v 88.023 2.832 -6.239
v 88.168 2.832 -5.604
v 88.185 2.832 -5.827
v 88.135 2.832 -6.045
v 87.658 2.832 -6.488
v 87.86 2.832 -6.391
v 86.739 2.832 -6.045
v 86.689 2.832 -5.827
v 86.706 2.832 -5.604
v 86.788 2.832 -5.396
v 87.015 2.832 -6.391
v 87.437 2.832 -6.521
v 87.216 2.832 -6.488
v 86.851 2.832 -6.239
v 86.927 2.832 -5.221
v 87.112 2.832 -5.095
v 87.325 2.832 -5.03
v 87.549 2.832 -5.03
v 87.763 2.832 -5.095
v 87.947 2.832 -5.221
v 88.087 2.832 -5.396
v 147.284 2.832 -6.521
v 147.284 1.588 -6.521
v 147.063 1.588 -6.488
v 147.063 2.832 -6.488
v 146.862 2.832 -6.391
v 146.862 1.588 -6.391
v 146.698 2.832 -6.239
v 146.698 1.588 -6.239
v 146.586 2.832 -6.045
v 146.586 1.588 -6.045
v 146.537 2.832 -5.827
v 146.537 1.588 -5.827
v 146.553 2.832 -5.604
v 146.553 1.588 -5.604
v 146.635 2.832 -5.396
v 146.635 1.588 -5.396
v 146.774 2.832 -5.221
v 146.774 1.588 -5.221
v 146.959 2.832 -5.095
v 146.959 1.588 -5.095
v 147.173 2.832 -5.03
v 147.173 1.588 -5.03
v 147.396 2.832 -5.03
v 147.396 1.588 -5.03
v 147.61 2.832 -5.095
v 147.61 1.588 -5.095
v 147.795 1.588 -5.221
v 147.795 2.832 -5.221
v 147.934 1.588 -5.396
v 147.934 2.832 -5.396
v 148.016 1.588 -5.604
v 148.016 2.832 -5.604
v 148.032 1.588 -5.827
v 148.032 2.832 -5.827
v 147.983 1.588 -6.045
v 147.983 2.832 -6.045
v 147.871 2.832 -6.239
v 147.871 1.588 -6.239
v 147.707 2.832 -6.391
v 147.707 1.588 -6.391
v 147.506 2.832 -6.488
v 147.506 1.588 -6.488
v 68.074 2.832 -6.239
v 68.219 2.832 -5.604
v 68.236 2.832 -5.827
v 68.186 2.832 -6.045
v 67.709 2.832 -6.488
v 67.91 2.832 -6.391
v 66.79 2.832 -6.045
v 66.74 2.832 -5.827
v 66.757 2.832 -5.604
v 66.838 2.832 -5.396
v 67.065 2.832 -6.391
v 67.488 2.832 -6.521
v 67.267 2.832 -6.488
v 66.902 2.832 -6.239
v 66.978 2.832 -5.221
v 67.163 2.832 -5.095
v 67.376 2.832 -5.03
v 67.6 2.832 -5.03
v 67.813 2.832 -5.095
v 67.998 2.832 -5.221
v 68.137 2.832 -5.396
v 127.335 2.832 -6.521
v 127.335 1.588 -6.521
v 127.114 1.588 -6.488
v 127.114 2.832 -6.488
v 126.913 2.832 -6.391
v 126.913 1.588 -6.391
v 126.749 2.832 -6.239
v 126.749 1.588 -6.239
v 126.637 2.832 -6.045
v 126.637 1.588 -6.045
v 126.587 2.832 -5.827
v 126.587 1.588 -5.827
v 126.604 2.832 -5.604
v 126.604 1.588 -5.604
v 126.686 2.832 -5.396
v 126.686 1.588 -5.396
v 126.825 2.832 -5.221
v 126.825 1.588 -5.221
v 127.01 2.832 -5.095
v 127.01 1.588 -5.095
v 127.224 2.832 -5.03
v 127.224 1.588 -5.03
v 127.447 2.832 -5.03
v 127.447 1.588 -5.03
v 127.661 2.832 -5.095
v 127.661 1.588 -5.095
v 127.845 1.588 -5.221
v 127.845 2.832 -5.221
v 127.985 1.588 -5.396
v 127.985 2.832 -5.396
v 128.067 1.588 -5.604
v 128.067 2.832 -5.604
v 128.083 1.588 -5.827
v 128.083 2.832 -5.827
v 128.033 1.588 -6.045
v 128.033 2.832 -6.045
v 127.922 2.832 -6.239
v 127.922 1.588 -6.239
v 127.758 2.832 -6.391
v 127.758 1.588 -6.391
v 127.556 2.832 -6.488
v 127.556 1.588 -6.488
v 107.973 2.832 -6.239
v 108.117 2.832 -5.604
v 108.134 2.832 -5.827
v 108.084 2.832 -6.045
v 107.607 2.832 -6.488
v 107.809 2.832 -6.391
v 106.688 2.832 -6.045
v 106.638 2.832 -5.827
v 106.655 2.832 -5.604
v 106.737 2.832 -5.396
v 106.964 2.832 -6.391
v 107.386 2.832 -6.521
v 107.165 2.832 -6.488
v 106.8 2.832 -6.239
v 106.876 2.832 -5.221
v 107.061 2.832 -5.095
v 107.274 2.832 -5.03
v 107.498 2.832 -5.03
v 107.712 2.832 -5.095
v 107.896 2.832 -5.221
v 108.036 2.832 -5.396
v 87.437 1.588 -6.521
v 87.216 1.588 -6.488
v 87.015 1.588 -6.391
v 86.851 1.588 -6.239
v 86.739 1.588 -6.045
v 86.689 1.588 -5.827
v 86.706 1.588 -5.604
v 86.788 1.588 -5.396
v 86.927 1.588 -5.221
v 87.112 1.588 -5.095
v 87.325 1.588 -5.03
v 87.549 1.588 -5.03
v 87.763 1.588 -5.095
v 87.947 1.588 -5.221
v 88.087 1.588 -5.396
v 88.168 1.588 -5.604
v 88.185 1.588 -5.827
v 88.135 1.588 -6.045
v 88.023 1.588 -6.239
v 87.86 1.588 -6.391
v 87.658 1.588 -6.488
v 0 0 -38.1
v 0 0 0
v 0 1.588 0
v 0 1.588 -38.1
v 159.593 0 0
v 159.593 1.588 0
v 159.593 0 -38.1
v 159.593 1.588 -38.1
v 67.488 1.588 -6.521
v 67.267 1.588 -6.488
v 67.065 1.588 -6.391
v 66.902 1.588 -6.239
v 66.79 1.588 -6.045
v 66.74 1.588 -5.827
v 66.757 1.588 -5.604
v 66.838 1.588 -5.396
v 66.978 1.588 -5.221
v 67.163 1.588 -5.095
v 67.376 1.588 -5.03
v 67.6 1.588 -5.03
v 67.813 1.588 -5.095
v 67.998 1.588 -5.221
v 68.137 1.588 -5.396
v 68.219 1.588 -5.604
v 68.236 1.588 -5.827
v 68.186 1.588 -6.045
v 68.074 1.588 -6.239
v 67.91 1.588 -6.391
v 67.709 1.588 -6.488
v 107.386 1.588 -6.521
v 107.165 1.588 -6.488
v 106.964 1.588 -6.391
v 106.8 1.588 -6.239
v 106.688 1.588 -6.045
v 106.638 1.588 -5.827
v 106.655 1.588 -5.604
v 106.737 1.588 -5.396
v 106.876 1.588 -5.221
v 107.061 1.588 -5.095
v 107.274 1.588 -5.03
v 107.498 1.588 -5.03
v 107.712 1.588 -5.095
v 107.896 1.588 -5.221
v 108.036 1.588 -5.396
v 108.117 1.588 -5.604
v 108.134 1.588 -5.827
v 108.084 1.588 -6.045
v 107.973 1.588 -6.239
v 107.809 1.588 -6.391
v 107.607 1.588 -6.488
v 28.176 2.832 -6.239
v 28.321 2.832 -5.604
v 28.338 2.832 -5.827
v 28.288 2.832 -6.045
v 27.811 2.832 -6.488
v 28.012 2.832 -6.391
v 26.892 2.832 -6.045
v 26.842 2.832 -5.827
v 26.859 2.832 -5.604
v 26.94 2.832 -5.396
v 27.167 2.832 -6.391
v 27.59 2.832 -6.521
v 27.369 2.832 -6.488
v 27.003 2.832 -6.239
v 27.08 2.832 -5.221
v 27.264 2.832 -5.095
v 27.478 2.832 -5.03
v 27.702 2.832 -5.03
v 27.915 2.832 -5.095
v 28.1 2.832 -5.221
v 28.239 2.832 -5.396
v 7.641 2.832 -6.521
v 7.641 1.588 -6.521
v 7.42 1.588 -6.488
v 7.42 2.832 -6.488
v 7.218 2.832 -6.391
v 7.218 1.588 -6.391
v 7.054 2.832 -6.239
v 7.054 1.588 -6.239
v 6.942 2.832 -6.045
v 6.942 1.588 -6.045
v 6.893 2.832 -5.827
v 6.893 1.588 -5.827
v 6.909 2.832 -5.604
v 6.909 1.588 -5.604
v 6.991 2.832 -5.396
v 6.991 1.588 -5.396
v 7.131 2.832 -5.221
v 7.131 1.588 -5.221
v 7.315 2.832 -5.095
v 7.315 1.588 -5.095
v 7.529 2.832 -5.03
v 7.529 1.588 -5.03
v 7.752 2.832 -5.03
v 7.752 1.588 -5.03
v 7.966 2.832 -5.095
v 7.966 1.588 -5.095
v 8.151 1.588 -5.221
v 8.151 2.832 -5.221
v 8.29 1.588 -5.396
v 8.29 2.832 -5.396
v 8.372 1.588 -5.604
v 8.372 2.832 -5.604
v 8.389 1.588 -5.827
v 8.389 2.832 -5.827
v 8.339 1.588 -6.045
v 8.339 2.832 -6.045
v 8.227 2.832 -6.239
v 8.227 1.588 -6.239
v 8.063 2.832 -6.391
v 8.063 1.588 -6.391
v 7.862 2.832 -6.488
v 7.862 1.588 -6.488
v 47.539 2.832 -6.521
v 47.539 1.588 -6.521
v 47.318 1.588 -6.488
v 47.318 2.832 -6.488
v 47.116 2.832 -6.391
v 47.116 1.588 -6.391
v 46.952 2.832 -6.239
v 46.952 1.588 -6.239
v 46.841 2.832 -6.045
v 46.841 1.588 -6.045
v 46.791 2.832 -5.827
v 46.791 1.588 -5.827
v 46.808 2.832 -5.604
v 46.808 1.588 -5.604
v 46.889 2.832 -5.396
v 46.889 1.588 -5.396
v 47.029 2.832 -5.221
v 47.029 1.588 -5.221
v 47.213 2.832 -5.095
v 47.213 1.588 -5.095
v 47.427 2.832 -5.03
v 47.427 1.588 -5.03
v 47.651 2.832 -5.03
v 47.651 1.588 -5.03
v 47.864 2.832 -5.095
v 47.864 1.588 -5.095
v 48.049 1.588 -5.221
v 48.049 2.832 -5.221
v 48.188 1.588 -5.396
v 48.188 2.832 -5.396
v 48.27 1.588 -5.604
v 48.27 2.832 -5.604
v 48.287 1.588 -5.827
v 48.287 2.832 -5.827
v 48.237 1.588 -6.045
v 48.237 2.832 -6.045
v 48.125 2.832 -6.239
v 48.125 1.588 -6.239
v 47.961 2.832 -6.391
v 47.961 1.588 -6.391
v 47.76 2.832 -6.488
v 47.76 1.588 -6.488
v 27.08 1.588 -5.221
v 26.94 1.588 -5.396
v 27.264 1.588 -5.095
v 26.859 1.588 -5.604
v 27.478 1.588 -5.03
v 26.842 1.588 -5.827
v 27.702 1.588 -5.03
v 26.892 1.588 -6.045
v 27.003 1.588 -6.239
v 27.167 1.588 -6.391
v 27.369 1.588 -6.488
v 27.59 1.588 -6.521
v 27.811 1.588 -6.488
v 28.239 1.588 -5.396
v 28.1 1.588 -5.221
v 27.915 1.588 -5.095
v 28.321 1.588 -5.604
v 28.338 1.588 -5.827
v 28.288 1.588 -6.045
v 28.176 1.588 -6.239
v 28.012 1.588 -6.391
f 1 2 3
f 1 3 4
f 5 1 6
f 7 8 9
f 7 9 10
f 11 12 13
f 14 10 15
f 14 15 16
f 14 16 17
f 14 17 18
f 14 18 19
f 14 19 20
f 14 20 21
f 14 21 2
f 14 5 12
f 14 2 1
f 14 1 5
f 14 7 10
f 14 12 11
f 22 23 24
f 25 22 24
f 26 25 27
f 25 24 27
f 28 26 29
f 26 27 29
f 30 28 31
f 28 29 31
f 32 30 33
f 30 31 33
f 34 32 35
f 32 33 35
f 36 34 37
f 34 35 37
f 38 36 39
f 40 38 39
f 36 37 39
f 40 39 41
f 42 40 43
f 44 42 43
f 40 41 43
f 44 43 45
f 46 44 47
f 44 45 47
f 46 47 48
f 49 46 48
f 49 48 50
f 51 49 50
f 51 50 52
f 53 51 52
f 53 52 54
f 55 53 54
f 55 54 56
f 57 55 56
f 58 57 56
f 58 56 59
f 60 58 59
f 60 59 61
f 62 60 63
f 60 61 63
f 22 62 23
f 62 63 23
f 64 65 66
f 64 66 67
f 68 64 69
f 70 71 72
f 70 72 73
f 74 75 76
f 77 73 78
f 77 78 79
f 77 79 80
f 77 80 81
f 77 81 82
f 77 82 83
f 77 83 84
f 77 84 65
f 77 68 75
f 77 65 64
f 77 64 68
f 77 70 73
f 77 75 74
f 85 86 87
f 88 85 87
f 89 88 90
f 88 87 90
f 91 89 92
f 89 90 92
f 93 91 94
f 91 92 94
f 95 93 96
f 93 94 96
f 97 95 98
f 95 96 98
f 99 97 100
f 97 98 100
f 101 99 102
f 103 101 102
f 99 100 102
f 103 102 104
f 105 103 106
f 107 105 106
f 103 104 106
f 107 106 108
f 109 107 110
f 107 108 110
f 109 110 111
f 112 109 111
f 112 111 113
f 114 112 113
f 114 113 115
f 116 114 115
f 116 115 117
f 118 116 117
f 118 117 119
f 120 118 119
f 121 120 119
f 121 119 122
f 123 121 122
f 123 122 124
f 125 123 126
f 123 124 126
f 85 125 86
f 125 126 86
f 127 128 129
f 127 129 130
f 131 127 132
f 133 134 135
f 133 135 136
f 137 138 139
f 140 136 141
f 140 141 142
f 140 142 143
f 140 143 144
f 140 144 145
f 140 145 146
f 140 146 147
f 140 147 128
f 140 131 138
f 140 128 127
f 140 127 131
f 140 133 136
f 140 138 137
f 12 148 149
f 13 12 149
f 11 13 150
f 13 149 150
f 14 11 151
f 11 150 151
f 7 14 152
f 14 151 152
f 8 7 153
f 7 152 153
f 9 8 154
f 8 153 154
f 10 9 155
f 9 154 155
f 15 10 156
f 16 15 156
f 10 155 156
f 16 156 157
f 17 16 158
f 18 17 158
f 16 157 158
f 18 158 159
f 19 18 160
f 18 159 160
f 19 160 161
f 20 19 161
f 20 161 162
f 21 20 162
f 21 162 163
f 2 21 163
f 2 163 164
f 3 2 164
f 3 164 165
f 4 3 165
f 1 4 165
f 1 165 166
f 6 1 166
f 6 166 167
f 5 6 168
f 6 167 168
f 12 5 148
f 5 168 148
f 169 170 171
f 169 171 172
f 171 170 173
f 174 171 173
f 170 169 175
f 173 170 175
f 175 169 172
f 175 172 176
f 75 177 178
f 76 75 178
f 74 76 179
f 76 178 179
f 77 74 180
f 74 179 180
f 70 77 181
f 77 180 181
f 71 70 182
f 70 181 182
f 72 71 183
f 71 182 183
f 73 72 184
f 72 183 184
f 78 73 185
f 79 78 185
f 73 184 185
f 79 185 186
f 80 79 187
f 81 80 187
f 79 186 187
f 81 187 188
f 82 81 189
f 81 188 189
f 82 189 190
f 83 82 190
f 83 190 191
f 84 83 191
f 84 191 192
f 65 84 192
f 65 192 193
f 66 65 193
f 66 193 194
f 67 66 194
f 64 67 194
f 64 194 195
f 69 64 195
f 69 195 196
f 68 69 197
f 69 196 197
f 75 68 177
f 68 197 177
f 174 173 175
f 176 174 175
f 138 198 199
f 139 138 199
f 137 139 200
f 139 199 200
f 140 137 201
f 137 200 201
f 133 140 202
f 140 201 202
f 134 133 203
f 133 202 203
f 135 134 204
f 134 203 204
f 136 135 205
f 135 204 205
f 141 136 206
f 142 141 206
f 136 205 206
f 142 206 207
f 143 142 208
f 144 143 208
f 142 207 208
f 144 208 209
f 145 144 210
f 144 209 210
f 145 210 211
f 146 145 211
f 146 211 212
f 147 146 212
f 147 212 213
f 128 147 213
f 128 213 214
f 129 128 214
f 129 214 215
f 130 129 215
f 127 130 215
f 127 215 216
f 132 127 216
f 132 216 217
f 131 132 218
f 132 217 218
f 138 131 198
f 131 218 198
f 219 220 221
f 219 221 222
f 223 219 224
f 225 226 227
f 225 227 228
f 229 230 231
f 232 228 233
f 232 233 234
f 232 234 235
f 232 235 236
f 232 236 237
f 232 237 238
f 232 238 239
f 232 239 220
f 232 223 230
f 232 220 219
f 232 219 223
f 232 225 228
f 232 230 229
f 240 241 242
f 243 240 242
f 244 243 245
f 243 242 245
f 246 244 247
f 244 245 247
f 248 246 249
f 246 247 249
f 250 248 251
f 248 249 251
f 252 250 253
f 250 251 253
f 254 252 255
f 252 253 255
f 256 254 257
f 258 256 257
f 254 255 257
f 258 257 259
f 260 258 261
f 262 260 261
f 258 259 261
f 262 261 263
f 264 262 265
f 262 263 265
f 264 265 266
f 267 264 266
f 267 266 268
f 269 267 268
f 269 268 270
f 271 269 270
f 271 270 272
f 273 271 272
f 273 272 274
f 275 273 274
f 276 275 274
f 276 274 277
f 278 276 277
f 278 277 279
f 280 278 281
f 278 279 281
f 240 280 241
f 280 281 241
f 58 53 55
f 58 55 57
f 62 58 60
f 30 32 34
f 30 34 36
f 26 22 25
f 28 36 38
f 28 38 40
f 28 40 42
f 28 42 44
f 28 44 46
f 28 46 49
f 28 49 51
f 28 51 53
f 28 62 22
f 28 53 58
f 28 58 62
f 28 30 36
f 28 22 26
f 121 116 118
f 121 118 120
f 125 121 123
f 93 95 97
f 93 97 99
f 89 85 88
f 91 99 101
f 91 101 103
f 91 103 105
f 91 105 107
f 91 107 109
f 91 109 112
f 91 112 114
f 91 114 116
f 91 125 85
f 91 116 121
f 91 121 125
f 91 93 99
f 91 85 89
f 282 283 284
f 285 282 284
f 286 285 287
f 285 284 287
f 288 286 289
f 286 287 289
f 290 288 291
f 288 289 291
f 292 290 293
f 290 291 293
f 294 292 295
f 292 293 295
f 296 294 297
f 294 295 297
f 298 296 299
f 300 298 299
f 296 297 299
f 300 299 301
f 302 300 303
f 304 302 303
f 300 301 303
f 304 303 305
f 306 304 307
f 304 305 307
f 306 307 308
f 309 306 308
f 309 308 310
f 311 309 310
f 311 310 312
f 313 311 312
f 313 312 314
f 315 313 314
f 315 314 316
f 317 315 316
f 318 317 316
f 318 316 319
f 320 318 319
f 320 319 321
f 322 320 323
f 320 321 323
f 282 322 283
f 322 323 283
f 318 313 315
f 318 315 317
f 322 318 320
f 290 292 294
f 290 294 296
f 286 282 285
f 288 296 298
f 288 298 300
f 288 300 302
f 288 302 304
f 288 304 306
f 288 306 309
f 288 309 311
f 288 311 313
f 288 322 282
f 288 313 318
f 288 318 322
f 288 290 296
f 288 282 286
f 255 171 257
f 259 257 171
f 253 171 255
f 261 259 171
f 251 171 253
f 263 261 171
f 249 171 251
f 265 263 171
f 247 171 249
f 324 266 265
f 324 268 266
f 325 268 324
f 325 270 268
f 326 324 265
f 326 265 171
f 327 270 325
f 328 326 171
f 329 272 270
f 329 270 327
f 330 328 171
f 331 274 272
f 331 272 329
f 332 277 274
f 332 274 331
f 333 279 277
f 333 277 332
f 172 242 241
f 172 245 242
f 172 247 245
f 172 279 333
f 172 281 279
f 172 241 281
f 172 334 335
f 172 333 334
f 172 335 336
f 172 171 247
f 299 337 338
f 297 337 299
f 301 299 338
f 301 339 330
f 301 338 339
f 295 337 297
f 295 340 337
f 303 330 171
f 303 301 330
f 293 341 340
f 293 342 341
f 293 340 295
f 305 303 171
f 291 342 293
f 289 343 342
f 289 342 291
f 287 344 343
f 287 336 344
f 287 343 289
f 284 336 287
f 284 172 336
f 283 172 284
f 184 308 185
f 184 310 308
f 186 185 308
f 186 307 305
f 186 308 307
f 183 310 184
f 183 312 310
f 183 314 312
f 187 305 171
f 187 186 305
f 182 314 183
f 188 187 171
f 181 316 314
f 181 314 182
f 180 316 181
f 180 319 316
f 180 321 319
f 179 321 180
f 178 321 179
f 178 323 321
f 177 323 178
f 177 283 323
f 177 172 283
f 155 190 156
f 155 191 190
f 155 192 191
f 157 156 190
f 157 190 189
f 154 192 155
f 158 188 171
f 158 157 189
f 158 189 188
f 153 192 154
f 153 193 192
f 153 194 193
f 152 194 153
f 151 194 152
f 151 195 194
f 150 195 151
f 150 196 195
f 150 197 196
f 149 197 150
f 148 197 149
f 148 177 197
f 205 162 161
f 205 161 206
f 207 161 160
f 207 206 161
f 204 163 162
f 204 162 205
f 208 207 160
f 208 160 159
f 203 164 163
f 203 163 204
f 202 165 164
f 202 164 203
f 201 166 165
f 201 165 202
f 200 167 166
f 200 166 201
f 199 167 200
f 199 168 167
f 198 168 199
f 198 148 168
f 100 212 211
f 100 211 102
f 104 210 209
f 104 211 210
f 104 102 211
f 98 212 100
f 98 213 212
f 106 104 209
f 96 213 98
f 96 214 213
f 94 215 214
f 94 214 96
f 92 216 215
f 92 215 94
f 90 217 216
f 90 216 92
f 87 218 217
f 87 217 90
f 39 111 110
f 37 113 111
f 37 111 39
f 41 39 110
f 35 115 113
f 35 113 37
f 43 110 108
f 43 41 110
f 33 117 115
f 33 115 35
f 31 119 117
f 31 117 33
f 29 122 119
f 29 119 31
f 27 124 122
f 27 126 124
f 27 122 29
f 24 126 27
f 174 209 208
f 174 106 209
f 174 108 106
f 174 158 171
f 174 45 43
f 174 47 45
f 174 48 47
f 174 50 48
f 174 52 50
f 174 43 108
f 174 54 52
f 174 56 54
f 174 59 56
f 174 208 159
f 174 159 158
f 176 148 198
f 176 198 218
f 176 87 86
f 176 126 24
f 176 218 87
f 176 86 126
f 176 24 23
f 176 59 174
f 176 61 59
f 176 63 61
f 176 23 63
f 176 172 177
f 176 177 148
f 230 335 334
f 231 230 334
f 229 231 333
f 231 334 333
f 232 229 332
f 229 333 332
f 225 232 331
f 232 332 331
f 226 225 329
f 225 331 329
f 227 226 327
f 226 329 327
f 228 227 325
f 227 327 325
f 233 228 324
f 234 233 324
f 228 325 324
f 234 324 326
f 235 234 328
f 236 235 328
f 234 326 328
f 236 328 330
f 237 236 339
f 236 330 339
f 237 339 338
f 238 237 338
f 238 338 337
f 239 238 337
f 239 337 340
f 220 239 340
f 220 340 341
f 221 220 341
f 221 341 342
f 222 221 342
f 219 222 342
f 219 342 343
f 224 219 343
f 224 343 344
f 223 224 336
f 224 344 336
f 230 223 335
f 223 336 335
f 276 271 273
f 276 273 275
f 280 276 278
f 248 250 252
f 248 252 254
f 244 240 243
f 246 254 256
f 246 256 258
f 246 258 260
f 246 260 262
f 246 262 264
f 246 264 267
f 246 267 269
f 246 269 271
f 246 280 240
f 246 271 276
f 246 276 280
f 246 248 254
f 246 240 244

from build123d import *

# Parameters (mm, degrees)
SKETCH1_W           = 159.592906802
SKETCH1_H           = 38.1
BOSS_EXTRUDE1_DEPTH = 1.5875
SKETCH2_R           = 0.75
BOSS_EXTRUDE2_DEPTH = 1.2446
LPATTERN1_COUNT     = 8
LPATTERN1_PITCH     = 19.94911335


with BuildPart() as part:
    # Sketch1 → Boss-Extrude1 (new body)
    with BuildSketch(Plane(origin=(0, 0, 0), x_dir=(1, 0, 0), z_dir=(0, 1, 0))):
        with Locations((79.796453401, 19.05)):
            Rectangle(SKETCH1_W, SKETCH1_H)
    extrude(amount=BOSS_EXTRUDE1_DEPTH)

    # Sketch2 → Boss-Extrude2 (add)
    with BuildSketch(Plane(origin=(0, 1.5875, 0), x_dir=(1, 0, 0), z_dir=(0, 1, 0))):
        with Locations(Location((7.640640269, 5.771220173, 0), (0, 0, 90))):
            Circle(SKETCH2_R)
    boss_extrude2 = extrude(amount=BOSS_EXTRUDE2_DEPTH)

    # LPattern1: Boss-Extrude2 ×8
    with Locations(*[(i * LPATTERN1_PITCH, 0, 0) for i in range(1, LPATTERN1_COUNT)]):
        add(boss_extrude2)


solid = part.part
